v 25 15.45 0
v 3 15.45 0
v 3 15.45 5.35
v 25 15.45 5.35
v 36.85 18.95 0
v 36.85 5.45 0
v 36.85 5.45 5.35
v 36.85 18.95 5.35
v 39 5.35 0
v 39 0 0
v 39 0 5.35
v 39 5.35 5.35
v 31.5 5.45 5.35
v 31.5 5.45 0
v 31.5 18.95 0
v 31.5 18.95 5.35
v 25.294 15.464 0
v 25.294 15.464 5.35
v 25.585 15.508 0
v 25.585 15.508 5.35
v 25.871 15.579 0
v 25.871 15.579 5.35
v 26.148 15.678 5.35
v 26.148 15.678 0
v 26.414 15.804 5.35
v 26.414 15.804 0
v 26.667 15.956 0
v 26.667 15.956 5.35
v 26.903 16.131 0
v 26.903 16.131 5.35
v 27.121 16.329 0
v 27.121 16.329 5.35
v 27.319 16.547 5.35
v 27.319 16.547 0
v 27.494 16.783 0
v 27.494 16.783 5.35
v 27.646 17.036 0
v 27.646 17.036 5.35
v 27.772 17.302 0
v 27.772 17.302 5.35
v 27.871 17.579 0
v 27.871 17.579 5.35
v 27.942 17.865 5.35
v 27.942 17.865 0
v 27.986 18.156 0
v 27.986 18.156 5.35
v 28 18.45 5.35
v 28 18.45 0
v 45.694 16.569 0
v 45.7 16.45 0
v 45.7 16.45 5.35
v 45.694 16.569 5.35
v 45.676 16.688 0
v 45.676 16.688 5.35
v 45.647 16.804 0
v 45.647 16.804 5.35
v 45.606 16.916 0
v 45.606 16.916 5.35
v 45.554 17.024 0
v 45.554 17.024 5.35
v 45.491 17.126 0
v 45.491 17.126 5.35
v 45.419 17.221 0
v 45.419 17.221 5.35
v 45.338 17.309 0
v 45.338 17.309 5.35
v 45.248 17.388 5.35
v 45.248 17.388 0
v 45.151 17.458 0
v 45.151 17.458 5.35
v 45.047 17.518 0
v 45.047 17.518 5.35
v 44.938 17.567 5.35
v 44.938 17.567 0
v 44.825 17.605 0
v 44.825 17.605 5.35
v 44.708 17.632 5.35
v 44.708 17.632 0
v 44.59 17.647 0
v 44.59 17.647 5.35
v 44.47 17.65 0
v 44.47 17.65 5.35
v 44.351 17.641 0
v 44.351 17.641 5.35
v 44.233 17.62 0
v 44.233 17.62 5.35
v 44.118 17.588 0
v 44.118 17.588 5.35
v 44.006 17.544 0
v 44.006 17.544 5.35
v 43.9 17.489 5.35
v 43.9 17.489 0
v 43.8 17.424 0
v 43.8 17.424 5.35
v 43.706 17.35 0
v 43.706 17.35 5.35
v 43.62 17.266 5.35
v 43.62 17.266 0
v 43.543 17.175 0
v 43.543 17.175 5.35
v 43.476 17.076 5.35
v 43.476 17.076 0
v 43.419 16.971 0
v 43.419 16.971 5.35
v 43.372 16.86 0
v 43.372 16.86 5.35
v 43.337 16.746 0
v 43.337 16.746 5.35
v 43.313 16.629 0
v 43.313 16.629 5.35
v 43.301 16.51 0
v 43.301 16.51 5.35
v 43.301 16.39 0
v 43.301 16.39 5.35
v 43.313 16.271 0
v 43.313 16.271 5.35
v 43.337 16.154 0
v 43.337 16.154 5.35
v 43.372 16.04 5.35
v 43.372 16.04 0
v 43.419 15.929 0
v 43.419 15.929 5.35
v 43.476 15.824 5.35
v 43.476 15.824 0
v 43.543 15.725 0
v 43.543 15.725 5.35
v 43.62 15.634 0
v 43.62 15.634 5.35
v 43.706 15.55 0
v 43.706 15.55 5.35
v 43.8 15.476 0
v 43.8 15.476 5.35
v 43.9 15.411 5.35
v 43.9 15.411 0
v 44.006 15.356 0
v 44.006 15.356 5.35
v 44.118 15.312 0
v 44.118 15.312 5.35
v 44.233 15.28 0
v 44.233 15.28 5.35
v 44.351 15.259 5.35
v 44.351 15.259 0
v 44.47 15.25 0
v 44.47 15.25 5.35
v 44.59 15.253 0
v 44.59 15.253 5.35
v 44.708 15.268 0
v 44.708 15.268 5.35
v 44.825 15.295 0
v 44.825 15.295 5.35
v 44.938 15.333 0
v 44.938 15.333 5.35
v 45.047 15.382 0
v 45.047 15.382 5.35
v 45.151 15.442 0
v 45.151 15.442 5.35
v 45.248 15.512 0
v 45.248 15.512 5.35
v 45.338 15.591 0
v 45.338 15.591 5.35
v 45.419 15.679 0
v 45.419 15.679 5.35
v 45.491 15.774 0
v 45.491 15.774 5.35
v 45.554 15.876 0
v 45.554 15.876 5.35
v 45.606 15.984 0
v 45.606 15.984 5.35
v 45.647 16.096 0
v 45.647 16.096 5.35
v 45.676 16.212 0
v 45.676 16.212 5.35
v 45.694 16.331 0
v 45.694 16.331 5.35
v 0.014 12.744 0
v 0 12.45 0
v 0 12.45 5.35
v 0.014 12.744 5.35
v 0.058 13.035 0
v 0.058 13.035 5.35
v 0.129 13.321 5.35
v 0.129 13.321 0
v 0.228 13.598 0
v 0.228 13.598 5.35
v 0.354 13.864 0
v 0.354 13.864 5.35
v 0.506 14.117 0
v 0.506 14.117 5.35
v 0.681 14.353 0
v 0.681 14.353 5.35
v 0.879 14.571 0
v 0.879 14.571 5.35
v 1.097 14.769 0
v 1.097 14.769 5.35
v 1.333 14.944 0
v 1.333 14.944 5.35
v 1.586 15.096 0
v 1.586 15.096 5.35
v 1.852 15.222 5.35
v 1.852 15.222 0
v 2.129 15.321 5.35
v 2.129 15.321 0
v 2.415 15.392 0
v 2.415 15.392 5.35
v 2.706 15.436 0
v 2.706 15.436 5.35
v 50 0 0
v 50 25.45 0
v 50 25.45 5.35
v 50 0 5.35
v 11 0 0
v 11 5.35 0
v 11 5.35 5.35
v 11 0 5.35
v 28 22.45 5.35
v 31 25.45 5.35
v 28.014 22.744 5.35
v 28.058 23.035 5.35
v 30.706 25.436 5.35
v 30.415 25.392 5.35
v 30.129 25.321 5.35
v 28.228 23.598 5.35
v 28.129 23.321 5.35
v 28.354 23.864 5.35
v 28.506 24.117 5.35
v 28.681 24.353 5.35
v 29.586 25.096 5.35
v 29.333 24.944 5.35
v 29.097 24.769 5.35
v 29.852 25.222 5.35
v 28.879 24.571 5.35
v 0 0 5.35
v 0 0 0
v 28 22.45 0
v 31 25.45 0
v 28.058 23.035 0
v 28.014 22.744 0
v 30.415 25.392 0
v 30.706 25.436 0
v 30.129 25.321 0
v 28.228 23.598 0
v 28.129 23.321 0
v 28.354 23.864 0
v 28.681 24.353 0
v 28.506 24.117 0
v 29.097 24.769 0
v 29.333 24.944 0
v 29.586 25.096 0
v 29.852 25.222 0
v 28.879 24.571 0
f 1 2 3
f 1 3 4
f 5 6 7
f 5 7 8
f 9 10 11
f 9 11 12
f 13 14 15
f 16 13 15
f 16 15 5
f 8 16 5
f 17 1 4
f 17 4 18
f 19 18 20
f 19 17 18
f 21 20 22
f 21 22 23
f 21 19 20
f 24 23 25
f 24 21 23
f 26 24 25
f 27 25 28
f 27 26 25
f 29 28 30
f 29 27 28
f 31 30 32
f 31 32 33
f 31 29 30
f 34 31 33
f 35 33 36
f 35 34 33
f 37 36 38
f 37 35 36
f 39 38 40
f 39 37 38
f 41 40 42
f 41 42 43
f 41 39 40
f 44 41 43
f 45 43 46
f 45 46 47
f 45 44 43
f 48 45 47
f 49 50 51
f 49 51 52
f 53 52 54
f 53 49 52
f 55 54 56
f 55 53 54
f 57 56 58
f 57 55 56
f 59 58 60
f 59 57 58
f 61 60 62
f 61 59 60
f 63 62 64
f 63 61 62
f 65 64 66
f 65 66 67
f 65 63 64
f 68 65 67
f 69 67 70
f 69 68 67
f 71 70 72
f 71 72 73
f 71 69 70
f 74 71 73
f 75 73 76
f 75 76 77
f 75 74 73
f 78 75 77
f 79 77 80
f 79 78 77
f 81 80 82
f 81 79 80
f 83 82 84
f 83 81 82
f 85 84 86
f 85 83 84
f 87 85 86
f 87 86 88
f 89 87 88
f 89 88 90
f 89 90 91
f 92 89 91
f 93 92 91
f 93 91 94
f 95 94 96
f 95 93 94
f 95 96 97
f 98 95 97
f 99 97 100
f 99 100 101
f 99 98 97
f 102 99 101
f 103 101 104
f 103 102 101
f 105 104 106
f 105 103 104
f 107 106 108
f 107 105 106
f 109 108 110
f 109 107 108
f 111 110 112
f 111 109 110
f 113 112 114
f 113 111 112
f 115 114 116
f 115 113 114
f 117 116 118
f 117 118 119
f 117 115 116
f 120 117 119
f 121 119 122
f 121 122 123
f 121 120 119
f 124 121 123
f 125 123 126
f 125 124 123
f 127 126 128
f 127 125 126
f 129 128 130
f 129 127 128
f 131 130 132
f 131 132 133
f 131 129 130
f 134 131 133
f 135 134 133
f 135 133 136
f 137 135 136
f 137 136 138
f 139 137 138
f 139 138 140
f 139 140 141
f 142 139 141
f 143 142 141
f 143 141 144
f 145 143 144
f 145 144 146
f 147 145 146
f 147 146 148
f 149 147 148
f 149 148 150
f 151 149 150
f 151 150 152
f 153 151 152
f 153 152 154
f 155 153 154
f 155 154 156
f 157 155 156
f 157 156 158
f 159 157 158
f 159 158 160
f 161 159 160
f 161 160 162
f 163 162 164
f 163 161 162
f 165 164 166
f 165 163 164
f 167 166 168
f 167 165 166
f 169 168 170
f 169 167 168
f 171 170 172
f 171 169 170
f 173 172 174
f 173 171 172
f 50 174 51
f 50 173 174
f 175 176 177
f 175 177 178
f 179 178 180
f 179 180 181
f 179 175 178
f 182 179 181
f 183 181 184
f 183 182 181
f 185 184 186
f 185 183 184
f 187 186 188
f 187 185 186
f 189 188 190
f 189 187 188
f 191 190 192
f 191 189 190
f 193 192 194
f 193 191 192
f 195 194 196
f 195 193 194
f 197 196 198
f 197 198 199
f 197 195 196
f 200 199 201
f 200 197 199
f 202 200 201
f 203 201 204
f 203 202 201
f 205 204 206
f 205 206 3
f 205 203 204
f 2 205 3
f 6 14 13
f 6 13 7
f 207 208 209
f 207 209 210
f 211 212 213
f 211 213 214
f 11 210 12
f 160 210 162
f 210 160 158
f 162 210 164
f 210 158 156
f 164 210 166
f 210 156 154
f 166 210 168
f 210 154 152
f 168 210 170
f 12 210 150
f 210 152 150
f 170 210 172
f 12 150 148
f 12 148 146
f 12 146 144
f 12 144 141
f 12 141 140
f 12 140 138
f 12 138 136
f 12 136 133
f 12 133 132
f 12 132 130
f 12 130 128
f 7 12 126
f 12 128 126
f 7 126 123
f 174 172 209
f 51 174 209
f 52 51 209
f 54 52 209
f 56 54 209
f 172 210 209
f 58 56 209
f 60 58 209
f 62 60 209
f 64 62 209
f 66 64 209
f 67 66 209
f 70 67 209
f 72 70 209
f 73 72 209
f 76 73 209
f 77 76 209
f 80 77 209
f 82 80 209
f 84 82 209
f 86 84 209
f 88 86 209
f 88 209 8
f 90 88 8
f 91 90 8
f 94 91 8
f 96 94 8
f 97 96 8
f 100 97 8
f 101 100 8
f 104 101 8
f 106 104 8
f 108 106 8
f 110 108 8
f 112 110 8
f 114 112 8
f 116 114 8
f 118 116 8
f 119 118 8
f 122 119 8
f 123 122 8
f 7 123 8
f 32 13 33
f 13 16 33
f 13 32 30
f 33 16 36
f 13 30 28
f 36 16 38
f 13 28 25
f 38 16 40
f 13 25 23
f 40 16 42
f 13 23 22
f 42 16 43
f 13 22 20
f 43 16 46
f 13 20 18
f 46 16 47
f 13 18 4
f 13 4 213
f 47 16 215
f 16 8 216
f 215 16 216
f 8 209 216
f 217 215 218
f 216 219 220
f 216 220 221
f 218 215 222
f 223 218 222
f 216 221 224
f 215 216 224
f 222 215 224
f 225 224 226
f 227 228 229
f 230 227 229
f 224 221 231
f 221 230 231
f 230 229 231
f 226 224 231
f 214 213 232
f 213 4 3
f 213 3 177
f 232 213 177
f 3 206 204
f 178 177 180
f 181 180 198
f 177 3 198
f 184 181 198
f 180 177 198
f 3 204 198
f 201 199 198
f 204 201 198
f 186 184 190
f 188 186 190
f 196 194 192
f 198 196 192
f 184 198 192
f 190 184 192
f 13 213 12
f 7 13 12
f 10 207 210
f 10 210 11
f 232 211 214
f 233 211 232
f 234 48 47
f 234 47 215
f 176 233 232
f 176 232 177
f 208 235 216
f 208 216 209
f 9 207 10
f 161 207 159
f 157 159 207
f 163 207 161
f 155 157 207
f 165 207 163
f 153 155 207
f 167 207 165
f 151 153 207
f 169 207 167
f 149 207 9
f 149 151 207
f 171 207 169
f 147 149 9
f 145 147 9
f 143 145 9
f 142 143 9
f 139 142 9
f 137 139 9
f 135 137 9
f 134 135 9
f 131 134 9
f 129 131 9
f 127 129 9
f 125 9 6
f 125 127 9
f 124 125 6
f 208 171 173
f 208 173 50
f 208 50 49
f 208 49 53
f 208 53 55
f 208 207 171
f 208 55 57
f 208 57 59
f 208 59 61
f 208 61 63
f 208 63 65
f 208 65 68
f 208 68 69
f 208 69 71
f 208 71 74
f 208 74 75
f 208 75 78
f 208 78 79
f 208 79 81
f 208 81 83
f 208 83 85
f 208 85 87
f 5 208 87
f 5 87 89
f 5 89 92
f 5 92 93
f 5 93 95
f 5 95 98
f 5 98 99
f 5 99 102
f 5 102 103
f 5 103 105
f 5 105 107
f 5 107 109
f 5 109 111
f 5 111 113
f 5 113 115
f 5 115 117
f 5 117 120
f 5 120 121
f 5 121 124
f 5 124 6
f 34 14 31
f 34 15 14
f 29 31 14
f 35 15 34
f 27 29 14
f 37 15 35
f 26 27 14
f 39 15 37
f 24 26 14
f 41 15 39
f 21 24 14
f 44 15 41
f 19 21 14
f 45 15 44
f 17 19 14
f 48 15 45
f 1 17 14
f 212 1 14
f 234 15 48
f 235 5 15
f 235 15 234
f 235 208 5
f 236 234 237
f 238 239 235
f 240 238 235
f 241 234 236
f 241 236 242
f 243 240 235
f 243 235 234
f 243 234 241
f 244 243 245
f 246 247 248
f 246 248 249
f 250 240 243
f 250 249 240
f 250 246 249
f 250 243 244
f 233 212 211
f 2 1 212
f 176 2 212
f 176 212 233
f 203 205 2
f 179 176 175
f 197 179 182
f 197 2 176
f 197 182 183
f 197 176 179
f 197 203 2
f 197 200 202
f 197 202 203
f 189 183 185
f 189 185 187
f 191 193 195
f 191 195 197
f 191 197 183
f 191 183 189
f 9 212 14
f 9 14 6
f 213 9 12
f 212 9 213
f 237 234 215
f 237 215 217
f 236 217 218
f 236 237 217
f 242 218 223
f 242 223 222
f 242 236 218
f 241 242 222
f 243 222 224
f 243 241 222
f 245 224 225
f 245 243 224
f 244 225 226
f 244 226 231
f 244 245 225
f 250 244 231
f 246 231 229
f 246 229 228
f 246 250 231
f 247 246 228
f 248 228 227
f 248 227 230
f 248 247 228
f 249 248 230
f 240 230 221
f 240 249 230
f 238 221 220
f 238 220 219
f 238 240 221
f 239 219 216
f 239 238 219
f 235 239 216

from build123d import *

# Parameters (mm, degrees)
MODEL_R             = 1.2
MODEL_W             = 5.350001156
MODEL_H             = 13.50000035
BOSS_EXTRUDE1_DEPTH = 5.35


with BuildPart() as part:
    # Model → Boss-Extrude1 (new body)
    with BuildSketch(Plane.XY):
        with BuildLine():
            Line((3.000000026, 15.449999832), (25.000000373, 15.449999832))
            ThreePointArc((25.000000373, 15.449999832), (27.121321034, 16.328679314), (28.000000864, 18.449999832))
            Line((28.000000864, 18.449999832), (28.000000864, 22.45000054))
            ThreePointArc((28.000000864, 22.45000054), (28.878680036, 24.571320398), (30.999999493, 25.450000539))
            Line((30.999999493, 25.450000539), (50.000000745, 25.450000539))
            Line((50.000000745, 25.450000539), (50.000000745, 0))
            Line((50.000000745, 0), (39.000000805, 0))
            Line((39.000000805, 0), (39.000000805, 5.350000225))
            Line((39.000000805, 5.350000225), (10.99999994, 5.350000225))
            Line((10.99999994, 5.350000225), (10.99999994, 0))
            Line((10.99999994, 0), (0, 0))
            Line((0, 0), (0, 12.449999832))
            ThreePointArc((0, 12.449999832), (0.878679666, 14.571320184), (3.000000026, 15.449999832))
        make_face()
        with Locations((44.5, 16.45)):
            Circle(MODEL_R, mode=Mode.SUBTRACT)
        with Locations((34.175001085, 12.20000023)):
            Rectangle(MODEL_W, MODEL_H, mode=Mode.SUBTRACT)
    extrude(amount=BOSS_EXTRUDE1_DEPTH)


solid = part.part
